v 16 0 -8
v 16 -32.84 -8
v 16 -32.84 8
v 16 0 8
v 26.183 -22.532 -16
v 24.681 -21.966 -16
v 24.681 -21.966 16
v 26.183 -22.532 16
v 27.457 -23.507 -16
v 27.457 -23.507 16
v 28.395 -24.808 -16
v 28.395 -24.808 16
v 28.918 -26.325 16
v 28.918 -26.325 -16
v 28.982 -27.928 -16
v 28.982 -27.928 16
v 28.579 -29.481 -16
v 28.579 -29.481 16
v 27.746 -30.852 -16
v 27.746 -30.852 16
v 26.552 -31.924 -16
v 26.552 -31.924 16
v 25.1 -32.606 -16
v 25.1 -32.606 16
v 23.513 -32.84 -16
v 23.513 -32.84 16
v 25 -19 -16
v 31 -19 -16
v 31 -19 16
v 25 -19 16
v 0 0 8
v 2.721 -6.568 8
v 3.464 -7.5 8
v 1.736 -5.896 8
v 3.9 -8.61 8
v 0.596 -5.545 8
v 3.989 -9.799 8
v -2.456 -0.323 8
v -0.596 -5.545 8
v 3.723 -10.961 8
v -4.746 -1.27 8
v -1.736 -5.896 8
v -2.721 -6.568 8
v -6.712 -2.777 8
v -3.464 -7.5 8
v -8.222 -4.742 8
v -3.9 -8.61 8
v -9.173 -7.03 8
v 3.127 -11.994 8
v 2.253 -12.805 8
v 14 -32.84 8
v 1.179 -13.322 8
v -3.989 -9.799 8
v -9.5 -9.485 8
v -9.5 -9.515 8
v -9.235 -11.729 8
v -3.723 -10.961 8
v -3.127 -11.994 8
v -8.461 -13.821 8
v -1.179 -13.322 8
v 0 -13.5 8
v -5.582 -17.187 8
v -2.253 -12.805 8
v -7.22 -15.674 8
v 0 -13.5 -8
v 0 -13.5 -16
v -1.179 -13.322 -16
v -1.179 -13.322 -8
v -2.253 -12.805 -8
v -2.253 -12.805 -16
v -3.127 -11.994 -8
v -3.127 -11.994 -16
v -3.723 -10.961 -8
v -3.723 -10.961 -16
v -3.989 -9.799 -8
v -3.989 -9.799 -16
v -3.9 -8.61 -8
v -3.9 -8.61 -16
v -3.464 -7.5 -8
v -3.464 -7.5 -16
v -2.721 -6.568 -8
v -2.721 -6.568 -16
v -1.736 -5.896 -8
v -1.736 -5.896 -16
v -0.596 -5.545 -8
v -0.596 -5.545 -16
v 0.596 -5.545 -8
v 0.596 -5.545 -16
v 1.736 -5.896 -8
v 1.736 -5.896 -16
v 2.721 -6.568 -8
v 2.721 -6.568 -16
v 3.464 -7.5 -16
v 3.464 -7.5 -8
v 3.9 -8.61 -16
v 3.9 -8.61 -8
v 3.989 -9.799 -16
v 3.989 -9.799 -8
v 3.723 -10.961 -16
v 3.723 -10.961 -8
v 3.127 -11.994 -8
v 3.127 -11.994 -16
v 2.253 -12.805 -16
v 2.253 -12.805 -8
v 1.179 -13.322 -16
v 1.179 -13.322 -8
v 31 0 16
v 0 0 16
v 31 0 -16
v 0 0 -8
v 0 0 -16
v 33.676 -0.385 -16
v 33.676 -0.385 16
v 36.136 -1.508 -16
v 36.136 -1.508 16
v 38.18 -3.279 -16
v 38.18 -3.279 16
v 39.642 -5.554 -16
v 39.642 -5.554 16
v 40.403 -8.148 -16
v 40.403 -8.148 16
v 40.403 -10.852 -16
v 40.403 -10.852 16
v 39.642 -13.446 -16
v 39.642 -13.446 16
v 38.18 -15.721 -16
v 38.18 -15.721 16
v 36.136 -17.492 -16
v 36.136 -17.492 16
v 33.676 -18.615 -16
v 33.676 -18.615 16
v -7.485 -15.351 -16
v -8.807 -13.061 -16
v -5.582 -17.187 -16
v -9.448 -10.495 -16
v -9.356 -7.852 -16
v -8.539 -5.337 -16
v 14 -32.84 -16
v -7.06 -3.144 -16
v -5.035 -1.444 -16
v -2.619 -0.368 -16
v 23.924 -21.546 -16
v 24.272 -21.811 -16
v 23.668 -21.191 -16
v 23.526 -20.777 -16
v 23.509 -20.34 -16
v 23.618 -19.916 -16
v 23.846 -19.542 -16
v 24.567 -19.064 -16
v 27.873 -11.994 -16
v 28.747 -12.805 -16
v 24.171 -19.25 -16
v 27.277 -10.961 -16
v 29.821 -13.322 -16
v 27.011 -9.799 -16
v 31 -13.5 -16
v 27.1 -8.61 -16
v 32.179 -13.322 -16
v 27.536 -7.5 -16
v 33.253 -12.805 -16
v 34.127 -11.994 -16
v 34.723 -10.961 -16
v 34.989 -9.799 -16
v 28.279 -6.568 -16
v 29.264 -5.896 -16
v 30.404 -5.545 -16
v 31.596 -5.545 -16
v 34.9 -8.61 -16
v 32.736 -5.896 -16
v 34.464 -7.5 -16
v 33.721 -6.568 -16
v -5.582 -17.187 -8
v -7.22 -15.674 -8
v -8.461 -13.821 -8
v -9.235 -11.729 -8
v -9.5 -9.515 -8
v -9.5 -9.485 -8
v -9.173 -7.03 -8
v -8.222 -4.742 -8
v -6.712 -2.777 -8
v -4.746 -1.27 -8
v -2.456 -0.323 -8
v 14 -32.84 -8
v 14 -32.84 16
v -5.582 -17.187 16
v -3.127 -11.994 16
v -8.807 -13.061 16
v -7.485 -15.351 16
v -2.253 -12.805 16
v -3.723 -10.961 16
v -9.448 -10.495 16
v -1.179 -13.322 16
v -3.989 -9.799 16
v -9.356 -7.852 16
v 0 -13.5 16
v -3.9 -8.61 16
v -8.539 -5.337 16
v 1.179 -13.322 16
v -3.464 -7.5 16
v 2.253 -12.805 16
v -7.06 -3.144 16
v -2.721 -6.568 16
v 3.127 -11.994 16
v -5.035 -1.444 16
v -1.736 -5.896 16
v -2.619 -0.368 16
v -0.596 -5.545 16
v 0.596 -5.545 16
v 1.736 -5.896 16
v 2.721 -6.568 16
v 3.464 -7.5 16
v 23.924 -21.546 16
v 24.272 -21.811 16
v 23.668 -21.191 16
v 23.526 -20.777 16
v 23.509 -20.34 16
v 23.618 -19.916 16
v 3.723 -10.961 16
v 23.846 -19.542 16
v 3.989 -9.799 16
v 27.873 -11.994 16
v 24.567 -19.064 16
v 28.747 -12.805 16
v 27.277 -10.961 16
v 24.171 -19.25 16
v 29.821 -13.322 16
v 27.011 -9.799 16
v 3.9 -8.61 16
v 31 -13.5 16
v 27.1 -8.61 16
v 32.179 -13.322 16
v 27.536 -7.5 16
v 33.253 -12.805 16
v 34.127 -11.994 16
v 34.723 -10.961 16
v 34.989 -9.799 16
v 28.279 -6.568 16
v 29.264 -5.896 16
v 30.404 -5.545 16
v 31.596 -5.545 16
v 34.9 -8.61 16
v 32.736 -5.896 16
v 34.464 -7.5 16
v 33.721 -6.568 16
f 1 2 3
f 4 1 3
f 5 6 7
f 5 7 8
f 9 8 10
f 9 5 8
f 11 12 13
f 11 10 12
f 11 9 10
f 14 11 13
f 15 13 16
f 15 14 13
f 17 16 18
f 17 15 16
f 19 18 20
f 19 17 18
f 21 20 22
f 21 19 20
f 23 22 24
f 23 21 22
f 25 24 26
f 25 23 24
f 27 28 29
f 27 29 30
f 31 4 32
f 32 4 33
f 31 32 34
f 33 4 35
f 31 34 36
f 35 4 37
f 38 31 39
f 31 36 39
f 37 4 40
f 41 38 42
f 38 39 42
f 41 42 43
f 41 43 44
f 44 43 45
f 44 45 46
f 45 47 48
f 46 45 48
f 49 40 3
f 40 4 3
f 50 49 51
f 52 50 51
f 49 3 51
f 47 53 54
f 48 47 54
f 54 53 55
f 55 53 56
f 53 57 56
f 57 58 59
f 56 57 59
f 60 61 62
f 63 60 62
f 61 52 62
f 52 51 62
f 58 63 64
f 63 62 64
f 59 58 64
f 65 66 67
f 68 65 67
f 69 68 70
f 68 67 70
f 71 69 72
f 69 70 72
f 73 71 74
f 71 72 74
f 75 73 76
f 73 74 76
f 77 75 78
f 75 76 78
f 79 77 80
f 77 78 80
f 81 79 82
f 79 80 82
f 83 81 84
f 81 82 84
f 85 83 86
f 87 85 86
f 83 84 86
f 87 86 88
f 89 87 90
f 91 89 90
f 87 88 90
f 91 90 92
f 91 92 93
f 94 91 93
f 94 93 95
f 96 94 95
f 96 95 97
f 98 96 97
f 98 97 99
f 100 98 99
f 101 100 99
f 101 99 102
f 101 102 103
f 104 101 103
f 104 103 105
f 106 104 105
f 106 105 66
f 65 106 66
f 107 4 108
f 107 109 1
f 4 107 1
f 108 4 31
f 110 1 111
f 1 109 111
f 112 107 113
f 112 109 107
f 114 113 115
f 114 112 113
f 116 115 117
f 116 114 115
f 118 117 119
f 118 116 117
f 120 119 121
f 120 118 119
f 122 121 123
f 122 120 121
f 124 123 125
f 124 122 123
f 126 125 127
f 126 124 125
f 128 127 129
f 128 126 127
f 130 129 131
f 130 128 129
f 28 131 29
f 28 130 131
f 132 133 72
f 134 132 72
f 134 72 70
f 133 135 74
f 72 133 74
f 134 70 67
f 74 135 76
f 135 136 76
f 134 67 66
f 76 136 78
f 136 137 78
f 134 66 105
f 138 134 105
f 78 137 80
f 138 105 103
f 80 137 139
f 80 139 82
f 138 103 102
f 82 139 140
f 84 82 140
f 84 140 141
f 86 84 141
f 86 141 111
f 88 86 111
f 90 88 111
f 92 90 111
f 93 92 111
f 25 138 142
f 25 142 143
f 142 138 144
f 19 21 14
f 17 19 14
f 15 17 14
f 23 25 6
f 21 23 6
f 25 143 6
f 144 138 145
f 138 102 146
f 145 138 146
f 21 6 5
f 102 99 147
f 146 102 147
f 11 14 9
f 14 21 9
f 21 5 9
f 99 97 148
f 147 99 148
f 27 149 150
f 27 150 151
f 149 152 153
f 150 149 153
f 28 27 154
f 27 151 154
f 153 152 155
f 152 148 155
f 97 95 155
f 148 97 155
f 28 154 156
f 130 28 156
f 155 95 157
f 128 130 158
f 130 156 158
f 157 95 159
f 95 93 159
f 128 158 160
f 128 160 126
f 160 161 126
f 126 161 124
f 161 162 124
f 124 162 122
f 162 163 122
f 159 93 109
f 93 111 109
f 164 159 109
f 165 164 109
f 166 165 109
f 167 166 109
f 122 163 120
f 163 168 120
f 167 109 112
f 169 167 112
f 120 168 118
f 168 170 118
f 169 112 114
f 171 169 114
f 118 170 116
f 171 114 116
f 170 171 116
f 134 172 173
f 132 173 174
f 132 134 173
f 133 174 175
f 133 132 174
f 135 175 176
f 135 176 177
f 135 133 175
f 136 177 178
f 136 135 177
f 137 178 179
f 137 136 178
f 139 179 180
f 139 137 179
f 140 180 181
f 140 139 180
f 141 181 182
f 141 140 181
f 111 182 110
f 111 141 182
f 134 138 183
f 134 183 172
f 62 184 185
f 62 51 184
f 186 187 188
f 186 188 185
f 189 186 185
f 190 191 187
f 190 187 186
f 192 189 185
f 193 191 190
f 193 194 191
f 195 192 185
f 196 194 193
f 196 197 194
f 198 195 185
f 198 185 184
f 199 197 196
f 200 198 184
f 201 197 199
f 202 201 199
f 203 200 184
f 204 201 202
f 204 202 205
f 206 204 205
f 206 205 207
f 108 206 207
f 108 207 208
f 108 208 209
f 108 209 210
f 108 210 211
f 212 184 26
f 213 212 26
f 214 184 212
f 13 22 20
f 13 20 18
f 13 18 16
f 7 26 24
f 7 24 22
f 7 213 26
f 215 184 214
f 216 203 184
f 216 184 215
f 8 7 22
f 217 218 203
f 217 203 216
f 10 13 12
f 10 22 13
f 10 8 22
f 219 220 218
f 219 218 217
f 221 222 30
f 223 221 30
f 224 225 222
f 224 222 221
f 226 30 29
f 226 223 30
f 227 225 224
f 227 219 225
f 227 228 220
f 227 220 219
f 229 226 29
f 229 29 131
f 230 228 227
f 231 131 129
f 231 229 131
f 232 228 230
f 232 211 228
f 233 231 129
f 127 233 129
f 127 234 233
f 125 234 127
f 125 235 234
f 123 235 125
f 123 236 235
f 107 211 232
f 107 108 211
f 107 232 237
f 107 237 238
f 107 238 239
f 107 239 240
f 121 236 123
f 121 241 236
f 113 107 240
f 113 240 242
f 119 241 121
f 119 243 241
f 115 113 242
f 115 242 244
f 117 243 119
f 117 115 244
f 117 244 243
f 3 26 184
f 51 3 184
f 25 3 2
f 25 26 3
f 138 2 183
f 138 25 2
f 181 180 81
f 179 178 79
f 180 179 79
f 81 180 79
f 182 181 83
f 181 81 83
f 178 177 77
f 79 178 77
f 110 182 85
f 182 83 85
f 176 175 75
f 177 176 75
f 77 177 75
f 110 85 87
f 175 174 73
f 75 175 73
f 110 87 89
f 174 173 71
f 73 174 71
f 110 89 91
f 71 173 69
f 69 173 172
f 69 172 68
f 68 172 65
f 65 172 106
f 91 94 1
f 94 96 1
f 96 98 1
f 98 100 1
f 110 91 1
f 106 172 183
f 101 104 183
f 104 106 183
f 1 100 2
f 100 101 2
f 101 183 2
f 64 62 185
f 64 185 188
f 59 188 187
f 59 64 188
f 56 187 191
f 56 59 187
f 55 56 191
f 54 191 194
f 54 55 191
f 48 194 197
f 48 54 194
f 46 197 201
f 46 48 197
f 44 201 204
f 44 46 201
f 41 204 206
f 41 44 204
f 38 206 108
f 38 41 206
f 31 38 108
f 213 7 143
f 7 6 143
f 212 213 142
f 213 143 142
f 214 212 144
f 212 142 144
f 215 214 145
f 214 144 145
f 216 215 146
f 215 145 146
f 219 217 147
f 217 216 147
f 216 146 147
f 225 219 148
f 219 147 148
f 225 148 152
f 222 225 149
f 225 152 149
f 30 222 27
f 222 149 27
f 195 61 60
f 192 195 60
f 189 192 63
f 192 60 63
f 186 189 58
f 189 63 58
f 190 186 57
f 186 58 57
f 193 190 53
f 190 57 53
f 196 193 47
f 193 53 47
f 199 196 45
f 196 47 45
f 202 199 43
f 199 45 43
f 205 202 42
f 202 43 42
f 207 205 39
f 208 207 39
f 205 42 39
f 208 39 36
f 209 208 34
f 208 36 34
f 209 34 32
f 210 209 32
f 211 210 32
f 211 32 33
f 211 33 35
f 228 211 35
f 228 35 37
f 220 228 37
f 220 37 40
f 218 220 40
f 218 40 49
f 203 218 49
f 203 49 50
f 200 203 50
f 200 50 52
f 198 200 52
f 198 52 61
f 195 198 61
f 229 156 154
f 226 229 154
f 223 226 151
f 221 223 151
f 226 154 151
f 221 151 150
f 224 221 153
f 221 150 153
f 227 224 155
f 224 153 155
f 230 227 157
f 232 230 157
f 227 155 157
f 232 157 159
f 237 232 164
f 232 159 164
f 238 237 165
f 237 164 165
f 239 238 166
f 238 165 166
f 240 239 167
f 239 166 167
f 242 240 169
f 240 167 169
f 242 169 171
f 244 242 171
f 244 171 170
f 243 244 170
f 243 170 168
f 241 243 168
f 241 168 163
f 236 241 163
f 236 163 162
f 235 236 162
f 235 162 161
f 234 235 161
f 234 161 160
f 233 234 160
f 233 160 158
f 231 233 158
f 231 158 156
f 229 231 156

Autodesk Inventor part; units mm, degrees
ref_plane "YZ Plane" through (0, 0, 0) normal (1, 0, 0) x (0, 1, 0)
ref_plane "XZ Plane" through (0, 0, 0) normal (0, 1, 0) x (-1, 0, 0)
sketch "Sketch1" plane through (0, 0, 0) normal (0, 0, 1) x (1, 0, 0)
  circle A0 centre (31, -9.5) radius 4 construction
  circle A1 centre (0, -9.5) radius 4 construction
  line L0 (31, 0) -> (0, 0)
  arc A2 (0, 0) -> (-5.5818, -17.1873) centre (0, -9.5) ccw
  line L1 (14, -32.8402) -> (-5.5818, -17.1873)
  line L2 (23.513, -32.8402) -> (14, -32.8402)
  arc A3 (23.513, -32.8402) -> (24.6813, -21.9658) centre (23.513, -27.3402) ccw
  arc A4 (25, -19) -> (24.6813, -21.9658) centre (25, -20.5) ccw
  line L3 (31, -19) -> (25, -19)
  arc A5 (31, -19) -> (31, 0) centre (31, -9.5) ccw
  point P0 (0, 0)
  dimension "d0" = 9.5
  dimension "d1" = 8
  dimension "d2" = 31
  dimension "d3" = 1.5
  dimension "d4" = 5.5
  dimension "d6" = 9.513
  dimension "d7" = 38.638
  dimension "d9" = 32.8402
  dimension "d10" = 16.9104
extrude "Extrusion1" add sketch "Sketch1" along normal mid plane 32
sketch "Sketch2" plane through (14, -32.8402, 16) normal (0, -1, 0) x (1, 0, 0)
  line L0 (0, -32) -> (0, 0) projected
  line L1 (-23.5, -32) -> (-23.5, 0) projected
  line L2 (-23.5, -24) -> (2, -24)
  line L3 (2, -24) -> (2, -8)
  line L4 (2, -8) -> (-23.5, -8)
  line L5 (-23.5, -8) -> (-23.5, -24)
  point P0 (-23.5, -16)
  dimension "d13" = 2
  dimension "d14" = 16
extrude "Extrusion2" cut sketch "Sketch2" against normal through all
hole "Hole1" at (31, -9.5, 16) direction (0, 0, -1) diameter 8 end through all
hole "Hole2" at (0, -9.5, 16) direction (0, 0, -1) diameter 8 end through all
equation "\"LENGTH\" = 25.4"
properties part number "TU-008"
